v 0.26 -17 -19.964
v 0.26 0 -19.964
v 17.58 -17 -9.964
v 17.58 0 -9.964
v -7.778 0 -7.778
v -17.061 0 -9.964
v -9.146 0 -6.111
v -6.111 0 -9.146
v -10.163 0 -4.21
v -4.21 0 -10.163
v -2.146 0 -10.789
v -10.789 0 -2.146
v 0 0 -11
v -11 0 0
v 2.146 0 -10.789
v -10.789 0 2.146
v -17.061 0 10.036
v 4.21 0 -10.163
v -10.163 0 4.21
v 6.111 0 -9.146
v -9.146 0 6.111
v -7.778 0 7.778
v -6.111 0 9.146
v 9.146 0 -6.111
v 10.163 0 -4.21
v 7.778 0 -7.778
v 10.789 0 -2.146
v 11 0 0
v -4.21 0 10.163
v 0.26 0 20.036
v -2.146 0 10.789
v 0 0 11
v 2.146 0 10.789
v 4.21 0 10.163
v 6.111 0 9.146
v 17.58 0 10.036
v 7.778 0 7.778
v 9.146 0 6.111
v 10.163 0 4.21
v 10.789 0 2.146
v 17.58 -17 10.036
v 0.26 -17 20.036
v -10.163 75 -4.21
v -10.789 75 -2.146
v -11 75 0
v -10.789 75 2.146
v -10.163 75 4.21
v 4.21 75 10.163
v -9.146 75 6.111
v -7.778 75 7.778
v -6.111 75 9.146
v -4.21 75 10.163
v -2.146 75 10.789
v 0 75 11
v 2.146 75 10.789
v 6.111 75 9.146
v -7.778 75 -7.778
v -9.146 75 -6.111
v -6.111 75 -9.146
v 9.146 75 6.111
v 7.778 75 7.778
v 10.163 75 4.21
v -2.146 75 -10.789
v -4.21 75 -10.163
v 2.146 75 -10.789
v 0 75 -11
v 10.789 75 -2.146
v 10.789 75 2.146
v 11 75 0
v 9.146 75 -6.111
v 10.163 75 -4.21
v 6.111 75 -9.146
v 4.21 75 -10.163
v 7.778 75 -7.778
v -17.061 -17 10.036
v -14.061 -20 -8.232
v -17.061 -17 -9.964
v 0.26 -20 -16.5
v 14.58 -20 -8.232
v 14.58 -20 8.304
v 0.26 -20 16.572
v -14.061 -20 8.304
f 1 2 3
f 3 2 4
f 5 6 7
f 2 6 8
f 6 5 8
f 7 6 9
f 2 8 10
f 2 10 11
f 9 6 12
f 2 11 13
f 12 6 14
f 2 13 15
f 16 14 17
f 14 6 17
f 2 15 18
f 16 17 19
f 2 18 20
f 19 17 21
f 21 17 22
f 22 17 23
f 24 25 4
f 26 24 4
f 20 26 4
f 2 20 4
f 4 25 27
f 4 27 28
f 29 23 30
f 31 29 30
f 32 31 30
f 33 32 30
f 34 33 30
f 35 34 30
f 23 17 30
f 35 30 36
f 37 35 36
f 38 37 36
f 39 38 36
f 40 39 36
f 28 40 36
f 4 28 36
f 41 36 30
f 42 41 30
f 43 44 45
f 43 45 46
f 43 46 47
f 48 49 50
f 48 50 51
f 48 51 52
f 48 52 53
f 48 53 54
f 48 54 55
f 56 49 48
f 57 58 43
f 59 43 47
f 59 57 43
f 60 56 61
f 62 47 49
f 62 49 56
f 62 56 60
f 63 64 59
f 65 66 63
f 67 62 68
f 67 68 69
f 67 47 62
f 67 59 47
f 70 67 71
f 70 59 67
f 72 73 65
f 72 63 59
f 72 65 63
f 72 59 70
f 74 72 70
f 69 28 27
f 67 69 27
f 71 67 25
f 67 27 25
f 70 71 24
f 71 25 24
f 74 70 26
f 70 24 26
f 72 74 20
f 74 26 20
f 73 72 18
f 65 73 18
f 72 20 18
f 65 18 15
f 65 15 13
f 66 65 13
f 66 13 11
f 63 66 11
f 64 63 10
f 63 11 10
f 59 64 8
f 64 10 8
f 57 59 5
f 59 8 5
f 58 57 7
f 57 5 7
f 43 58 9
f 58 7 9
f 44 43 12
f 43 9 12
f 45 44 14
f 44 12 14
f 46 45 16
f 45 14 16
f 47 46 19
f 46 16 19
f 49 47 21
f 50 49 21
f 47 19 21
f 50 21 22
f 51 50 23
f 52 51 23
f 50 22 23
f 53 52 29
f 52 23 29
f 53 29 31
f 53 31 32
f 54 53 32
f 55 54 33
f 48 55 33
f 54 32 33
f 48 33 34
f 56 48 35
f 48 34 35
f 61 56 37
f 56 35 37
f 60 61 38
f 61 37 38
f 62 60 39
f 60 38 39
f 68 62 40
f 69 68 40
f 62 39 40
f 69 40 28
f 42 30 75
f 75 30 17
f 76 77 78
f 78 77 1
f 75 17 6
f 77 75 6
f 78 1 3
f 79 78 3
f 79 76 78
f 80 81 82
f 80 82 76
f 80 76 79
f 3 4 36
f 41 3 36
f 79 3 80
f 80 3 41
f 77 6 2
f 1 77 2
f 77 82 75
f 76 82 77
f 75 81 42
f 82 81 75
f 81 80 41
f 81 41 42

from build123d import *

# Parameters (mm, degrees)
SKETCH_1_R      = 11
EXTRUDE_4_DEPTH = 75
EXTRUDE_5_DEPTH = 20
CHAMFER_2_SIZE  = 3


with BuildPart() as part:
    # Эскиз1 → Бобышка-Вытянуть4 (new body)
    with BuildSketch(Plane(origin=(0, 0, 0), x_dir=(1, 0, 0), z_dir=(0, 1, 0))):
        Circle(SKETCH_1_R)
    extrude(amount=EXTRUDE_4_DEPTH)

    # Эскиз3 → Бобышка-Вытянуть5 (add)
    with BuildSketch(Plane.XZ):
        Polygon((0.259699185, 20.035631897), (-17.060808891, 10.035631897), (-17.060808891, -9.964368103), (0.259699185, -19.964368103), (17.58020726, -9.964368103), (17.58020726, 10.035631897), align=None)
    extrude(amount=EXTRUDE_5_DEPTH)

    # Фаска2
    chamfer_2_edges = [part.edges().sort_by_distance(p)[0] for p in [
        (8.919953222, -20, 15.035631897),
        (-8.400554853, -20, 15.035631897),
        (-17.060808891, -20, 0.035631897),
        (-8.400554853, -20, -14.964368103),
        (8.919953222, -20, -14.964368103),
        (17.58020726, -20, 0.035631897),
    ]]
    chamfer(chamfer_2_edges, length=CHAMFER_2_SIZE)


solid = part.part
